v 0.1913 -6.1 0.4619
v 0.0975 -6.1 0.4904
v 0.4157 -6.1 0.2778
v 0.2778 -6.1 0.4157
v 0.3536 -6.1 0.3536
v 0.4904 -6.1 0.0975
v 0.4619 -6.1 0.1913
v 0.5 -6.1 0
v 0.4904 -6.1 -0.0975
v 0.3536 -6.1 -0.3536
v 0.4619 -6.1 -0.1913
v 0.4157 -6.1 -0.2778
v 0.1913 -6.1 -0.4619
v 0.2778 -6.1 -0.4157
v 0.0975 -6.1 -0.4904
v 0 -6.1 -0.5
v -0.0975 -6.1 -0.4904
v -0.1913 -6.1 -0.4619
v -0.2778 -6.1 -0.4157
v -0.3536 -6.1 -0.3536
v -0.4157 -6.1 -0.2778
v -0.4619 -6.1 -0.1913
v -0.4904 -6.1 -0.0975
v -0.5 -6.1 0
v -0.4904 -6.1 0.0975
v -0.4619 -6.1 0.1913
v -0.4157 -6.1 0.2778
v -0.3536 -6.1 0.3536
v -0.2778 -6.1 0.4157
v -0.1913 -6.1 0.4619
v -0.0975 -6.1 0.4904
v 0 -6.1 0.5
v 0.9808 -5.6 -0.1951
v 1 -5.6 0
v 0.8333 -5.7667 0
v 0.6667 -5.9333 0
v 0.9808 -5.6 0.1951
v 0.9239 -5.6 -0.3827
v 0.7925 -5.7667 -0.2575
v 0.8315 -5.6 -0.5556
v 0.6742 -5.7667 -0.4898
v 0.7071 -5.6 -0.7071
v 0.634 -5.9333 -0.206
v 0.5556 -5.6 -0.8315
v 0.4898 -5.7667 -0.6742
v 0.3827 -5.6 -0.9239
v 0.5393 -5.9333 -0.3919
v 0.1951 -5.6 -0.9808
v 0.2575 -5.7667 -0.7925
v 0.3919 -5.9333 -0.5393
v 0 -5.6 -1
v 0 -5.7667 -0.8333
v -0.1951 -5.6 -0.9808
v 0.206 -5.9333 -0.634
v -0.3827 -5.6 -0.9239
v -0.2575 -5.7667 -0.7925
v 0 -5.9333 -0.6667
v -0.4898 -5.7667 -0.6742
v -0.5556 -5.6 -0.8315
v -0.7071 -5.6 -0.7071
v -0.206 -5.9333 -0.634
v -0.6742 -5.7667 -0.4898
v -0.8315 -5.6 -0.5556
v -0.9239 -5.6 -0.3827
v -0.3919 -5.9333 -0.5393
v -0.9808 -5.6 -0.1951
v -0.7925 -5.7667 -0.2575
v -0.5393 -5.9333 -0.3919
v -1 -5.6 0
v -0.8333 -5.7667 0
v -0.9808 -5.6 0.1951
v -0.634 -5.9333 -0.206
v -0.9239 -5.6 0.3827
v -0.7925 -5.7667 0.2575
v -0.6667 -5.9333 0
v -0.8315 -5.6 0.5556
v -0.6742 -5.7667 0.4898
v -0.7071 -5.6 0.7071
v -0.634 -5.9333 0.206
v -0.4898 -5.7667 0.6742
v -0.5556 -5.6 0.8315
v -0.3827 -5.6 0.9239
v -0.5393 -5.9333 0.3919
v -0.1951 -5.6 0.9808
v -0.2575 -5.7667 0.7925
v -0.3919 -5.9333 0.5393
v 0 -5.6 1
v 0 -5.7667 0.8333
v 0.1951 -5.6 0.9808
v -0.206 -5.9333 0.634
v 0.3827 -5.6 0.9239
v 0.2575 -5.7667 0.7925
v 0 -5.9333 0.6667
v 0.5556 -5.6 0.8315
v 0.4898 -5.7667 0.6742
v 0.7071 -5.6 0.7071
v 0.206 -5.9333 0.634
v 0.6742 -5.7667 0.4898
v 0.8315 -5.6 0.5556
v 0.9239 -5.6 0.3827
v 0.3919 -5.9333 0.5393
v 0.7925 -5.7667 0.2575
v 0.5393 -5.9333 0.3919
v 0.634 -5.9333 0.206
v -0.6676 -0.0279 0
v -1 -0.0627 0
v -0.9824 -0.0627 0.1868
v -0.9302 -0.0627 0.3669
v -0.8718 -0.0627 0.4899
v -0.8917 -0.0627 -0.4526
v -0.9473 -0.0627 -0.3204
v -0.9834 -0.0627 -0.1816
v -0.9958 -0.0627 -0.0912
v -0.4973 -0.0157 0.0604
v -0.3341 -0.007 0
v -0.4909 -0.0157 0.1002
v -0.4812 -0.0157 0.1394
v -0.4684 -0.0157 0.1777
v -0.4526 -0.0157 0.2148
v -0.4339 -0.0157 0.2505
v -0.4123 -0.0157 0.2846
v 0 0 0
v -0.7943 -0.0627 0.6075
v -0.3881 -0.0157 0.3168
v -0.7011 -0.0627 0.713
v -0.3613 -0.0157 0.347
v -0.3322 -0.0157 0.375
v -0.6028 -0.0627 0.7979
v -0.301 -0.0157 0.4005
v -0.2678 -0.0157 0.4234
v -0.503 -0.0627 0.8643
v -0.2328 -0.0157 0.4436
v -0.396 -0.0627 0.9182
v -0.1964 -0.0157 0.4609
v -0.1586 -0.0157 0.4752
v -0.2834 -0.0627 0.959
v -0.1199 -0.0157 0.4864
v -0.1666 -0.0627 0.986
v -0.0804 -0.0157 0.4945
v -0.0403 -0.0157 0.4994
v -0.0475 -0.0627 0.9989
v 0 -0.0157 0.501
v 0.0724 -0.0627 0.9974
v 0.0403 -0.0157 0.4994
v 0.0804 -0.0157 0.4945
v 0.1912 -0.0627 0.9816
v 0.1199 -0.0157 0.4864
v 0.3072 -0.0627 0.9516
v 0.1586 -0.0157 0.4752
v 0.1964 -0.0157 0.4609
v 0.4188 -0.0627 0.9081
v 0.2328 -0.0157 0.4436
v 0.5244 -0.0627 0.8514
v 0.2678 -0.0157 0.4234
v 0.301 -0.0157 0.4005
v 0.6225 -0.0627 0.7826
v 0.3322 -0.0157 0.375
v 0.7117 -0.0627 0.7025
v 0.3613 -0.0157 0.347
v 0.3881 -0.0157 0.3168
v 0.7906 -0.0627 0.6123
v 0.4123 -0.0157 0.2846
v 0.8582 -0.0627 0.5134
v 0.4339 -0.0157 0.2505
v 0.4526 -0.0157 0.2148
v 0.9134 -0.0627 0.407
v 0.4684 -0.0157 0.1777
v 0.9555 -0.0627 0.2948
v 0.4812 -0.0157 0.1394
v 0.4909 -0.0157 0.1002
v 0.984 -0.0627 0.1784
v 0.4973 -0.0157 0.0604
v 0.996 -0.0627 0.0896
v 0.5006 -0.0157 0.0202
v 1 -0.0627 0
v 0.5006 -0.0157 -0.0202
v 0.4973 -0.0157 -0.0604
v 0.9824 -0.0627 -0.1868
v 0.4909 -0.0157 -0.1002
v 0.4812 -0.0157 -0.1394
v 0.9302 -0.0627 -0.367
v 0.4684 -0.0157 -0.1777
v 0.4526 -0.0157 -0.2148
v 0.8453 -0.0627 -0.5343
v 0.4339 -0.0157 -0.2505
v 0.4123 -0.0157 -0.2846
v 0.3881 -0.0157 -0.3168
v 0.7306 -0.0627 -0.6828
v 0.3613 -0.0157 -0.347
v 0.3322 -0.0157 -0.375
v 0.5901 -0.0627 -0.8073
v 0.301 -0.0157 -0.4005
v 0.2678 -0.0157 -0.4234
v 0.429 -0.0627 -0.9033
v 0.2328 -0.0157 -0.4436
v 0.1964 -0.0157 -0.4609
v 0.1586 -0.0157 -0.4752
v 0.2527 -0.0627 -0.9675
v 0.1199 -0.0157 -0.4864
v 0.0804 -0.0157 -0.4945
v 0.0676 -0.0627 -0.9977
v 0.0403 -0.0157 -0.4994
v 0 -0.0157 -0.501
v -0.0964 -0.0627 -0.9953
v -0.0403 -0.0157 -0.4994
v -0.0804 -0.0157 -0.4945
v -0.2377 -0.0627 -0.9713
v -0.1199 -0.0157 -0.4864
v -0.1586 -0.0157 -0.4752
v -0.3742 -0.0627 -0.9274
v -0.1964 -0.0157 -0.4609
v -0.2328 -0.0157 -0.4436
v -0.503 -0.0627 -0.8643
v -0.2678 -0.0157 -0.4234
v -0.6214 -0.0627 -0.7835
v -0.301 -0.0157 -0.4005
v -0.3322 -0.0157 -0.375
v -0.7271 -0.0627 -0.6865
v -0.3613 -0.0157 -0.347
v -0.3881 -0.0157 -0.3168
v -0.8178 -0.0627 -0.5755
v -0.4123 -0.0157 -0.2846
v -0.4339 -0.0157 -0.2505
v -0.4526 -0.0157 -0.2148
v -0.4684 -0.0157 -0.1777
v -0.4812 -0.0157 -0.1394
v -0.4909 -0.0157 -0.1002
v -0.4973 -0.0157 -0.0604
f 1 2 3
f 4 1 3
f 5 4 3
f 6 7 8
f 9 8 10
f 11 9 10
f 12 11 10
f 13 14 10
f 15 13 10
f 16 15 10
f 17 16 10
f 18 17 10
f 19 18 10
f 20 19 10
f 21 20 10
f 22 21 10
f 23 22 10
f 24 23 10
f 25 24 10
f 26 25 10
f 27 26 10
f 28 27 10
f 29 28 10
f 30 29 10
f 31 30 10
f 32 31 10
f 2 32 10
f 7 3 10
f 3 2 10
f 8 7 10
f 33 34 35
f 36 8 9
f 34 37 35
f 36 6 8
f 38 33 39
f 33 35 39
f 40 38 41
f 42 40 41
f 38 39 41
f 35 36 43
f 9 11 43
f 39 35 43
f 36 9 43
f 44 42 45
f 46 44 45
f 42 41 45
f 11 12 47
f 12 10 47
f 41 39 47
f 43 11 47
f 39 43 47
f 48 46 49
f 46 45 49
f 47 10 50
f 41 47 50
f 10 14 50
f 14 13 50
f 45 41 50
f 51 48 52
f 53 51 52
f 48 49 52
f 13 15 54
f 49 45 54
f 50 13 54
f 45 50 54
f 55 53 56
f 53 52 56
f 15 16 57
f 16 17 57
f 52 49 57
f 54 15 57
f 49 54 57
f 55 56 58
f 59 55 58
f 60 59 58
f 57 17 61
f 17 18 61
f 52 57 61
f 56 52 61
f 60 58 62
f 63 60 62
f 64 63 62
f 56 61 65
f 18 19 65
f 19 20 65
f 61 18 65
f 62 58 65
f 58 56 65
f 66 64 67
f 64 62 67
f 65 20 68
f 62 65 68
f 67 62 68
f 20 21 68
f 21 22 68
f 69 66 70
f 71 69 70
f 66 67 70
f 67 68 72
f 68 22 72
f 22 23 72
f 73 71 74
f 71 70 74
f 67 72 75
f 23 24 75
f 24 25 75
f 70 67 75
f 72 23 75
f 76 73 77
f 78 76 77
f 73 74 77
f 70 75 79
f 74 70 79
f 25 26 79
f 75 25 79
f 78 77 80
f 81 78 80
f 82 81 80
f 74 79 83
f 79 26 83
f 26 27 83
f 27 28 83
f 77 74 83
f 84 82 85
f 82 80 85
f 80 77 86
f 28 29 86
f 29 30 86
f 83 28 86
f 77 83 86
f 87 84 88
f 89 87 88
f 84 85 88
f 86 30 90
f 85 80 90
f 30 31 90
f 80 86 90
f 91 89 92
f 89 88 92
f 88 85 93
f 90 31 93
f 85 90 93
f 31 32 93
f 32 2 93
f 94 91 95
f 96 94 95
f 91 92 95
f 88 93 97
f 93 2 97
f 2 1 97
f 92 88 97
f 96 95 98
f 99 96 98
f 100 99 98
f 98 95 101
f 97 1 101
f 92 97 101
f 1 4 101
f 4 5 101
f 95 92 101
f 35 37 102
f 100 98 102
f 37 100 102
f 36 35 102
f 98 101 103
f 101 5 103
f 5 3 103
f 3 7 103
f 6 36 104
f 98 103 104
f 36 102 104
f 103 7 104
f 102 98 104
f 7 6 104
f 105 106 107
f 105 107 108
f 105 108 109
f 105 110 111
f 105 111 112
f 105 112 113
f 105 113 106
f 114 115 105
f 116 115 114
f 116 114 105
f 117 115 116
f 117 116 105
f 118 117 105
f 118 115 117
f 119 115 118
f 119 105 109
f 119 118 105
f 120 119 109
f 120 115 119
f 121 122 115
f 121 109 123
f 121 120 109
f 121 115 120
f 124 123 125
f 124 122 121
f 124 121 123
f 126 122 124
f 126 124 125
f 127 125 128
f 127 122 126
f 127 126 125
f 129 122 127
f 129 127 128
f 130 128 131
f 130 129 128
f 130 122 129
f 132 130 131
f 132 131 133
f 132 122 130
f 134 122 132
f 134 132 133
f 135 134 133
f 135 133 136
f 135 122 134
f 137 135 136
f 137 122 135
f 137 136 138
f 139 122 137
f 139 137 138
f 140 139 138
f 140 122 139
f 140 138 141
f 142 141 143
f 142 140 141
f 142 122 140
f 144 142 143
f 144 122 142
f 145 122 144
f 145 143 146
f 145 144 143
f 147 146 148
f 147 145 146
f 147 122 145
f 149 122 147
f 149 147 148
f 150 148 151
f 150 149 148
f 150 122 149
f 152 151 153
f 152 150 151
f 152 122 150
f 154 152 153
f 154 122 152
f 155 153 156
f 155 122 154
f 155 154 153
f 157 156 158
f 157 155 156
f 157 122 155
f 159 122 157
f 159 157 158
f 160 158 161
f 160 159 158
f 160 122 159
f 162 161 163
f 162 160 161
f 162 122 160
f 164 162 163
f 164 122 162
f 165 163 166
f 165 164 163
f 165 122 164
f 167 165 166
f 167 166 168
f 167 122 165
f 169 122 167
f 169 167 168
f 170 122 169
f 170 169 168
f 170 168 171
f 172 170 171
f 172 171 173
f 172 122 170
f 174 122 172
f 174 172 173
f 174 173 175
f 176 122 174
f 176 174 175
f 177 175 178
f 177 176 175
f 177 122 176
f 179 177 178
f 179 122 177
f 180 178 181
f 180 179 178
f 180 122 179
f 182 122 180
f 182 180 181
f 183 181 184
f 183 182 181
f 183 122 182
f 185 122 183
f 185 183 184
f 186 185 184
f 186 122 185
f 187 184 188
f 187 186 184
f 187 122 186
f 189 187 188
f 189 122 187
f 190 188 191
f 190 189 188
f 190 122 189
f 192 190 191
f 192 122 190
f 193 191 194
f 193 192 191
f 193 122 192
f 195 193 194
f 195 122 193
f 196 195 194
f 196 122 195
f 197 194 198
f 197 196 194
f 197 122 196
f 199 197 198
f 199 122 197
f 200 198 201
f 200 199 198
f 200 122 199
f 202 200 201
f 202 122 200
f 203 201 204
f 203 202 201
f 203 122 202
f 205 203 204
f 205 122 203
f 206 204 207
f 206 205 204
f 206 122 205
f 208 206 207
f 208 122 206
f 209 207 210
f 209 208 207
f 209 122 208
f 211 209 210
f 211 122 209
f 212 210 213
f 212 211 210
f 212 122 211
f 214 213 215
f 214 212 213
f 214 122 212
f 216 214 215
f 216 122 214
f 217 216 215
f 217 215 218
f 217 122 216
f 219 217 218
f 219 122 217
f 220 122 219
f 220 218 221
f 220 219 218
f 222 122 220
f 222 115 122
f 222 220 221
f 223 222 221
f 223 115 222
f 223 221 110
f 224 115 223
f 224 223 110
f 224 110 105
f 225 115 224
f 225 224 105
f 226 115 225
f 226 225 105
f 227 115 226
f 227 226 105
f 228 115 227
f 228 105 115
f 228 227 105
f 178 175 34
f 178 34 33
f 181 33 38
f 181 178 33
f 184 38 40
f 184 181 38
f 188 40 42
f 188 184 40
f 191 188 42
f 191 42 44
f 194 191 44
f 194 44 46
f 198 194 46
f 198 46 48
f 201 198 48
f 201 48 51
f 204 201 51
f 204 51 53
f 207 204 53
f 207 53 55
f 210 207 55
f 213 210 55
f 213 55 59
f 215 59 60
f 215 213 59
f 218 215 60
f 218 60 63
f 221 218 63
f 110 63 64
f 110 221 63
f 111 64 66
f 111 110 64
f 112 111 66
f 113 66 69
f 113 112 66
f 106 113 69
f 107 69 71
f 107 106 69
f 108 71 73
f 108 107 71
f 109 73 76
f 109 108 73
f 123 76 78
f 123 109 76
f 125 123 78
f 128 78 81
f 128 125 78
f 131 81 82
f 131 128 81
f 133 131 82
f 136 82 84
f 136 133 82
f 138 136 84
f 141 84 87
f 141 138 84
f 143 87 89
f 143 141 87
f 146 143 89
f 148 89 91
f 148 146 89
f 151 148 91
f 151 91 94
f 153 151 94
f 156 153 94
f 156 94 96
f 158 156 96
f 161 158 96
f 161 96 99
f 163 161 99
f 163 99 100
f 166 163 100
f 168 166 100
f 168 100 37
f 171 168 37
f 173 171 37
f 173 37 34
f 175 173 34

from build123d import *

# Parameters (mm, degrees)
SKETCH1_R                 = 1
BOSS_EXTRUDE_6_10MM_DEPTH = 6.1
F_0_5_X_45_DEG_SIZE       = 0.5


with BuildPart() as part:
    # Sketch1 → Boss-Extrude 6.10mm (new body)
    with BuildSketch(Plane(origin=(0, 0, 0), x_dir=(1, 0, 0), z_dir=(0, 1, 0))):
        Circle(SKETCH1_R)
    extrude(amount=-BOSS_EXTRUDE_6_10MM_DEPTH)

    # 0.5 x 45 deg
    f_0_5_x_45_deg_edges = [part.edges().sort_by_distance(p)[0] for p in [
        (-1, -6.1, 0),
    ]]
    chamfer(f_0_5_x_45_deg_edges, length=F_0_5_X_45_DEG_SIZE)

    # Sketch2 → SR8 (revolve, cut)
    with BuildSketch(Plane.XY):
        with BuildLine():
            Line((0, 2), (-2, 2))
            Line((-2, 2), (-2, -0.254033308))
            ThreePointArc((-2, -0.254033308), (-1.00803434, -0.06376243), (0, 0))
            Line((0, 0), (0, 2))
        make_face()
    revolve(axis=Axis((0, 0, 0), (0, 1, 0)), mode=Mode.SUBTRACT)


solid = part.part
